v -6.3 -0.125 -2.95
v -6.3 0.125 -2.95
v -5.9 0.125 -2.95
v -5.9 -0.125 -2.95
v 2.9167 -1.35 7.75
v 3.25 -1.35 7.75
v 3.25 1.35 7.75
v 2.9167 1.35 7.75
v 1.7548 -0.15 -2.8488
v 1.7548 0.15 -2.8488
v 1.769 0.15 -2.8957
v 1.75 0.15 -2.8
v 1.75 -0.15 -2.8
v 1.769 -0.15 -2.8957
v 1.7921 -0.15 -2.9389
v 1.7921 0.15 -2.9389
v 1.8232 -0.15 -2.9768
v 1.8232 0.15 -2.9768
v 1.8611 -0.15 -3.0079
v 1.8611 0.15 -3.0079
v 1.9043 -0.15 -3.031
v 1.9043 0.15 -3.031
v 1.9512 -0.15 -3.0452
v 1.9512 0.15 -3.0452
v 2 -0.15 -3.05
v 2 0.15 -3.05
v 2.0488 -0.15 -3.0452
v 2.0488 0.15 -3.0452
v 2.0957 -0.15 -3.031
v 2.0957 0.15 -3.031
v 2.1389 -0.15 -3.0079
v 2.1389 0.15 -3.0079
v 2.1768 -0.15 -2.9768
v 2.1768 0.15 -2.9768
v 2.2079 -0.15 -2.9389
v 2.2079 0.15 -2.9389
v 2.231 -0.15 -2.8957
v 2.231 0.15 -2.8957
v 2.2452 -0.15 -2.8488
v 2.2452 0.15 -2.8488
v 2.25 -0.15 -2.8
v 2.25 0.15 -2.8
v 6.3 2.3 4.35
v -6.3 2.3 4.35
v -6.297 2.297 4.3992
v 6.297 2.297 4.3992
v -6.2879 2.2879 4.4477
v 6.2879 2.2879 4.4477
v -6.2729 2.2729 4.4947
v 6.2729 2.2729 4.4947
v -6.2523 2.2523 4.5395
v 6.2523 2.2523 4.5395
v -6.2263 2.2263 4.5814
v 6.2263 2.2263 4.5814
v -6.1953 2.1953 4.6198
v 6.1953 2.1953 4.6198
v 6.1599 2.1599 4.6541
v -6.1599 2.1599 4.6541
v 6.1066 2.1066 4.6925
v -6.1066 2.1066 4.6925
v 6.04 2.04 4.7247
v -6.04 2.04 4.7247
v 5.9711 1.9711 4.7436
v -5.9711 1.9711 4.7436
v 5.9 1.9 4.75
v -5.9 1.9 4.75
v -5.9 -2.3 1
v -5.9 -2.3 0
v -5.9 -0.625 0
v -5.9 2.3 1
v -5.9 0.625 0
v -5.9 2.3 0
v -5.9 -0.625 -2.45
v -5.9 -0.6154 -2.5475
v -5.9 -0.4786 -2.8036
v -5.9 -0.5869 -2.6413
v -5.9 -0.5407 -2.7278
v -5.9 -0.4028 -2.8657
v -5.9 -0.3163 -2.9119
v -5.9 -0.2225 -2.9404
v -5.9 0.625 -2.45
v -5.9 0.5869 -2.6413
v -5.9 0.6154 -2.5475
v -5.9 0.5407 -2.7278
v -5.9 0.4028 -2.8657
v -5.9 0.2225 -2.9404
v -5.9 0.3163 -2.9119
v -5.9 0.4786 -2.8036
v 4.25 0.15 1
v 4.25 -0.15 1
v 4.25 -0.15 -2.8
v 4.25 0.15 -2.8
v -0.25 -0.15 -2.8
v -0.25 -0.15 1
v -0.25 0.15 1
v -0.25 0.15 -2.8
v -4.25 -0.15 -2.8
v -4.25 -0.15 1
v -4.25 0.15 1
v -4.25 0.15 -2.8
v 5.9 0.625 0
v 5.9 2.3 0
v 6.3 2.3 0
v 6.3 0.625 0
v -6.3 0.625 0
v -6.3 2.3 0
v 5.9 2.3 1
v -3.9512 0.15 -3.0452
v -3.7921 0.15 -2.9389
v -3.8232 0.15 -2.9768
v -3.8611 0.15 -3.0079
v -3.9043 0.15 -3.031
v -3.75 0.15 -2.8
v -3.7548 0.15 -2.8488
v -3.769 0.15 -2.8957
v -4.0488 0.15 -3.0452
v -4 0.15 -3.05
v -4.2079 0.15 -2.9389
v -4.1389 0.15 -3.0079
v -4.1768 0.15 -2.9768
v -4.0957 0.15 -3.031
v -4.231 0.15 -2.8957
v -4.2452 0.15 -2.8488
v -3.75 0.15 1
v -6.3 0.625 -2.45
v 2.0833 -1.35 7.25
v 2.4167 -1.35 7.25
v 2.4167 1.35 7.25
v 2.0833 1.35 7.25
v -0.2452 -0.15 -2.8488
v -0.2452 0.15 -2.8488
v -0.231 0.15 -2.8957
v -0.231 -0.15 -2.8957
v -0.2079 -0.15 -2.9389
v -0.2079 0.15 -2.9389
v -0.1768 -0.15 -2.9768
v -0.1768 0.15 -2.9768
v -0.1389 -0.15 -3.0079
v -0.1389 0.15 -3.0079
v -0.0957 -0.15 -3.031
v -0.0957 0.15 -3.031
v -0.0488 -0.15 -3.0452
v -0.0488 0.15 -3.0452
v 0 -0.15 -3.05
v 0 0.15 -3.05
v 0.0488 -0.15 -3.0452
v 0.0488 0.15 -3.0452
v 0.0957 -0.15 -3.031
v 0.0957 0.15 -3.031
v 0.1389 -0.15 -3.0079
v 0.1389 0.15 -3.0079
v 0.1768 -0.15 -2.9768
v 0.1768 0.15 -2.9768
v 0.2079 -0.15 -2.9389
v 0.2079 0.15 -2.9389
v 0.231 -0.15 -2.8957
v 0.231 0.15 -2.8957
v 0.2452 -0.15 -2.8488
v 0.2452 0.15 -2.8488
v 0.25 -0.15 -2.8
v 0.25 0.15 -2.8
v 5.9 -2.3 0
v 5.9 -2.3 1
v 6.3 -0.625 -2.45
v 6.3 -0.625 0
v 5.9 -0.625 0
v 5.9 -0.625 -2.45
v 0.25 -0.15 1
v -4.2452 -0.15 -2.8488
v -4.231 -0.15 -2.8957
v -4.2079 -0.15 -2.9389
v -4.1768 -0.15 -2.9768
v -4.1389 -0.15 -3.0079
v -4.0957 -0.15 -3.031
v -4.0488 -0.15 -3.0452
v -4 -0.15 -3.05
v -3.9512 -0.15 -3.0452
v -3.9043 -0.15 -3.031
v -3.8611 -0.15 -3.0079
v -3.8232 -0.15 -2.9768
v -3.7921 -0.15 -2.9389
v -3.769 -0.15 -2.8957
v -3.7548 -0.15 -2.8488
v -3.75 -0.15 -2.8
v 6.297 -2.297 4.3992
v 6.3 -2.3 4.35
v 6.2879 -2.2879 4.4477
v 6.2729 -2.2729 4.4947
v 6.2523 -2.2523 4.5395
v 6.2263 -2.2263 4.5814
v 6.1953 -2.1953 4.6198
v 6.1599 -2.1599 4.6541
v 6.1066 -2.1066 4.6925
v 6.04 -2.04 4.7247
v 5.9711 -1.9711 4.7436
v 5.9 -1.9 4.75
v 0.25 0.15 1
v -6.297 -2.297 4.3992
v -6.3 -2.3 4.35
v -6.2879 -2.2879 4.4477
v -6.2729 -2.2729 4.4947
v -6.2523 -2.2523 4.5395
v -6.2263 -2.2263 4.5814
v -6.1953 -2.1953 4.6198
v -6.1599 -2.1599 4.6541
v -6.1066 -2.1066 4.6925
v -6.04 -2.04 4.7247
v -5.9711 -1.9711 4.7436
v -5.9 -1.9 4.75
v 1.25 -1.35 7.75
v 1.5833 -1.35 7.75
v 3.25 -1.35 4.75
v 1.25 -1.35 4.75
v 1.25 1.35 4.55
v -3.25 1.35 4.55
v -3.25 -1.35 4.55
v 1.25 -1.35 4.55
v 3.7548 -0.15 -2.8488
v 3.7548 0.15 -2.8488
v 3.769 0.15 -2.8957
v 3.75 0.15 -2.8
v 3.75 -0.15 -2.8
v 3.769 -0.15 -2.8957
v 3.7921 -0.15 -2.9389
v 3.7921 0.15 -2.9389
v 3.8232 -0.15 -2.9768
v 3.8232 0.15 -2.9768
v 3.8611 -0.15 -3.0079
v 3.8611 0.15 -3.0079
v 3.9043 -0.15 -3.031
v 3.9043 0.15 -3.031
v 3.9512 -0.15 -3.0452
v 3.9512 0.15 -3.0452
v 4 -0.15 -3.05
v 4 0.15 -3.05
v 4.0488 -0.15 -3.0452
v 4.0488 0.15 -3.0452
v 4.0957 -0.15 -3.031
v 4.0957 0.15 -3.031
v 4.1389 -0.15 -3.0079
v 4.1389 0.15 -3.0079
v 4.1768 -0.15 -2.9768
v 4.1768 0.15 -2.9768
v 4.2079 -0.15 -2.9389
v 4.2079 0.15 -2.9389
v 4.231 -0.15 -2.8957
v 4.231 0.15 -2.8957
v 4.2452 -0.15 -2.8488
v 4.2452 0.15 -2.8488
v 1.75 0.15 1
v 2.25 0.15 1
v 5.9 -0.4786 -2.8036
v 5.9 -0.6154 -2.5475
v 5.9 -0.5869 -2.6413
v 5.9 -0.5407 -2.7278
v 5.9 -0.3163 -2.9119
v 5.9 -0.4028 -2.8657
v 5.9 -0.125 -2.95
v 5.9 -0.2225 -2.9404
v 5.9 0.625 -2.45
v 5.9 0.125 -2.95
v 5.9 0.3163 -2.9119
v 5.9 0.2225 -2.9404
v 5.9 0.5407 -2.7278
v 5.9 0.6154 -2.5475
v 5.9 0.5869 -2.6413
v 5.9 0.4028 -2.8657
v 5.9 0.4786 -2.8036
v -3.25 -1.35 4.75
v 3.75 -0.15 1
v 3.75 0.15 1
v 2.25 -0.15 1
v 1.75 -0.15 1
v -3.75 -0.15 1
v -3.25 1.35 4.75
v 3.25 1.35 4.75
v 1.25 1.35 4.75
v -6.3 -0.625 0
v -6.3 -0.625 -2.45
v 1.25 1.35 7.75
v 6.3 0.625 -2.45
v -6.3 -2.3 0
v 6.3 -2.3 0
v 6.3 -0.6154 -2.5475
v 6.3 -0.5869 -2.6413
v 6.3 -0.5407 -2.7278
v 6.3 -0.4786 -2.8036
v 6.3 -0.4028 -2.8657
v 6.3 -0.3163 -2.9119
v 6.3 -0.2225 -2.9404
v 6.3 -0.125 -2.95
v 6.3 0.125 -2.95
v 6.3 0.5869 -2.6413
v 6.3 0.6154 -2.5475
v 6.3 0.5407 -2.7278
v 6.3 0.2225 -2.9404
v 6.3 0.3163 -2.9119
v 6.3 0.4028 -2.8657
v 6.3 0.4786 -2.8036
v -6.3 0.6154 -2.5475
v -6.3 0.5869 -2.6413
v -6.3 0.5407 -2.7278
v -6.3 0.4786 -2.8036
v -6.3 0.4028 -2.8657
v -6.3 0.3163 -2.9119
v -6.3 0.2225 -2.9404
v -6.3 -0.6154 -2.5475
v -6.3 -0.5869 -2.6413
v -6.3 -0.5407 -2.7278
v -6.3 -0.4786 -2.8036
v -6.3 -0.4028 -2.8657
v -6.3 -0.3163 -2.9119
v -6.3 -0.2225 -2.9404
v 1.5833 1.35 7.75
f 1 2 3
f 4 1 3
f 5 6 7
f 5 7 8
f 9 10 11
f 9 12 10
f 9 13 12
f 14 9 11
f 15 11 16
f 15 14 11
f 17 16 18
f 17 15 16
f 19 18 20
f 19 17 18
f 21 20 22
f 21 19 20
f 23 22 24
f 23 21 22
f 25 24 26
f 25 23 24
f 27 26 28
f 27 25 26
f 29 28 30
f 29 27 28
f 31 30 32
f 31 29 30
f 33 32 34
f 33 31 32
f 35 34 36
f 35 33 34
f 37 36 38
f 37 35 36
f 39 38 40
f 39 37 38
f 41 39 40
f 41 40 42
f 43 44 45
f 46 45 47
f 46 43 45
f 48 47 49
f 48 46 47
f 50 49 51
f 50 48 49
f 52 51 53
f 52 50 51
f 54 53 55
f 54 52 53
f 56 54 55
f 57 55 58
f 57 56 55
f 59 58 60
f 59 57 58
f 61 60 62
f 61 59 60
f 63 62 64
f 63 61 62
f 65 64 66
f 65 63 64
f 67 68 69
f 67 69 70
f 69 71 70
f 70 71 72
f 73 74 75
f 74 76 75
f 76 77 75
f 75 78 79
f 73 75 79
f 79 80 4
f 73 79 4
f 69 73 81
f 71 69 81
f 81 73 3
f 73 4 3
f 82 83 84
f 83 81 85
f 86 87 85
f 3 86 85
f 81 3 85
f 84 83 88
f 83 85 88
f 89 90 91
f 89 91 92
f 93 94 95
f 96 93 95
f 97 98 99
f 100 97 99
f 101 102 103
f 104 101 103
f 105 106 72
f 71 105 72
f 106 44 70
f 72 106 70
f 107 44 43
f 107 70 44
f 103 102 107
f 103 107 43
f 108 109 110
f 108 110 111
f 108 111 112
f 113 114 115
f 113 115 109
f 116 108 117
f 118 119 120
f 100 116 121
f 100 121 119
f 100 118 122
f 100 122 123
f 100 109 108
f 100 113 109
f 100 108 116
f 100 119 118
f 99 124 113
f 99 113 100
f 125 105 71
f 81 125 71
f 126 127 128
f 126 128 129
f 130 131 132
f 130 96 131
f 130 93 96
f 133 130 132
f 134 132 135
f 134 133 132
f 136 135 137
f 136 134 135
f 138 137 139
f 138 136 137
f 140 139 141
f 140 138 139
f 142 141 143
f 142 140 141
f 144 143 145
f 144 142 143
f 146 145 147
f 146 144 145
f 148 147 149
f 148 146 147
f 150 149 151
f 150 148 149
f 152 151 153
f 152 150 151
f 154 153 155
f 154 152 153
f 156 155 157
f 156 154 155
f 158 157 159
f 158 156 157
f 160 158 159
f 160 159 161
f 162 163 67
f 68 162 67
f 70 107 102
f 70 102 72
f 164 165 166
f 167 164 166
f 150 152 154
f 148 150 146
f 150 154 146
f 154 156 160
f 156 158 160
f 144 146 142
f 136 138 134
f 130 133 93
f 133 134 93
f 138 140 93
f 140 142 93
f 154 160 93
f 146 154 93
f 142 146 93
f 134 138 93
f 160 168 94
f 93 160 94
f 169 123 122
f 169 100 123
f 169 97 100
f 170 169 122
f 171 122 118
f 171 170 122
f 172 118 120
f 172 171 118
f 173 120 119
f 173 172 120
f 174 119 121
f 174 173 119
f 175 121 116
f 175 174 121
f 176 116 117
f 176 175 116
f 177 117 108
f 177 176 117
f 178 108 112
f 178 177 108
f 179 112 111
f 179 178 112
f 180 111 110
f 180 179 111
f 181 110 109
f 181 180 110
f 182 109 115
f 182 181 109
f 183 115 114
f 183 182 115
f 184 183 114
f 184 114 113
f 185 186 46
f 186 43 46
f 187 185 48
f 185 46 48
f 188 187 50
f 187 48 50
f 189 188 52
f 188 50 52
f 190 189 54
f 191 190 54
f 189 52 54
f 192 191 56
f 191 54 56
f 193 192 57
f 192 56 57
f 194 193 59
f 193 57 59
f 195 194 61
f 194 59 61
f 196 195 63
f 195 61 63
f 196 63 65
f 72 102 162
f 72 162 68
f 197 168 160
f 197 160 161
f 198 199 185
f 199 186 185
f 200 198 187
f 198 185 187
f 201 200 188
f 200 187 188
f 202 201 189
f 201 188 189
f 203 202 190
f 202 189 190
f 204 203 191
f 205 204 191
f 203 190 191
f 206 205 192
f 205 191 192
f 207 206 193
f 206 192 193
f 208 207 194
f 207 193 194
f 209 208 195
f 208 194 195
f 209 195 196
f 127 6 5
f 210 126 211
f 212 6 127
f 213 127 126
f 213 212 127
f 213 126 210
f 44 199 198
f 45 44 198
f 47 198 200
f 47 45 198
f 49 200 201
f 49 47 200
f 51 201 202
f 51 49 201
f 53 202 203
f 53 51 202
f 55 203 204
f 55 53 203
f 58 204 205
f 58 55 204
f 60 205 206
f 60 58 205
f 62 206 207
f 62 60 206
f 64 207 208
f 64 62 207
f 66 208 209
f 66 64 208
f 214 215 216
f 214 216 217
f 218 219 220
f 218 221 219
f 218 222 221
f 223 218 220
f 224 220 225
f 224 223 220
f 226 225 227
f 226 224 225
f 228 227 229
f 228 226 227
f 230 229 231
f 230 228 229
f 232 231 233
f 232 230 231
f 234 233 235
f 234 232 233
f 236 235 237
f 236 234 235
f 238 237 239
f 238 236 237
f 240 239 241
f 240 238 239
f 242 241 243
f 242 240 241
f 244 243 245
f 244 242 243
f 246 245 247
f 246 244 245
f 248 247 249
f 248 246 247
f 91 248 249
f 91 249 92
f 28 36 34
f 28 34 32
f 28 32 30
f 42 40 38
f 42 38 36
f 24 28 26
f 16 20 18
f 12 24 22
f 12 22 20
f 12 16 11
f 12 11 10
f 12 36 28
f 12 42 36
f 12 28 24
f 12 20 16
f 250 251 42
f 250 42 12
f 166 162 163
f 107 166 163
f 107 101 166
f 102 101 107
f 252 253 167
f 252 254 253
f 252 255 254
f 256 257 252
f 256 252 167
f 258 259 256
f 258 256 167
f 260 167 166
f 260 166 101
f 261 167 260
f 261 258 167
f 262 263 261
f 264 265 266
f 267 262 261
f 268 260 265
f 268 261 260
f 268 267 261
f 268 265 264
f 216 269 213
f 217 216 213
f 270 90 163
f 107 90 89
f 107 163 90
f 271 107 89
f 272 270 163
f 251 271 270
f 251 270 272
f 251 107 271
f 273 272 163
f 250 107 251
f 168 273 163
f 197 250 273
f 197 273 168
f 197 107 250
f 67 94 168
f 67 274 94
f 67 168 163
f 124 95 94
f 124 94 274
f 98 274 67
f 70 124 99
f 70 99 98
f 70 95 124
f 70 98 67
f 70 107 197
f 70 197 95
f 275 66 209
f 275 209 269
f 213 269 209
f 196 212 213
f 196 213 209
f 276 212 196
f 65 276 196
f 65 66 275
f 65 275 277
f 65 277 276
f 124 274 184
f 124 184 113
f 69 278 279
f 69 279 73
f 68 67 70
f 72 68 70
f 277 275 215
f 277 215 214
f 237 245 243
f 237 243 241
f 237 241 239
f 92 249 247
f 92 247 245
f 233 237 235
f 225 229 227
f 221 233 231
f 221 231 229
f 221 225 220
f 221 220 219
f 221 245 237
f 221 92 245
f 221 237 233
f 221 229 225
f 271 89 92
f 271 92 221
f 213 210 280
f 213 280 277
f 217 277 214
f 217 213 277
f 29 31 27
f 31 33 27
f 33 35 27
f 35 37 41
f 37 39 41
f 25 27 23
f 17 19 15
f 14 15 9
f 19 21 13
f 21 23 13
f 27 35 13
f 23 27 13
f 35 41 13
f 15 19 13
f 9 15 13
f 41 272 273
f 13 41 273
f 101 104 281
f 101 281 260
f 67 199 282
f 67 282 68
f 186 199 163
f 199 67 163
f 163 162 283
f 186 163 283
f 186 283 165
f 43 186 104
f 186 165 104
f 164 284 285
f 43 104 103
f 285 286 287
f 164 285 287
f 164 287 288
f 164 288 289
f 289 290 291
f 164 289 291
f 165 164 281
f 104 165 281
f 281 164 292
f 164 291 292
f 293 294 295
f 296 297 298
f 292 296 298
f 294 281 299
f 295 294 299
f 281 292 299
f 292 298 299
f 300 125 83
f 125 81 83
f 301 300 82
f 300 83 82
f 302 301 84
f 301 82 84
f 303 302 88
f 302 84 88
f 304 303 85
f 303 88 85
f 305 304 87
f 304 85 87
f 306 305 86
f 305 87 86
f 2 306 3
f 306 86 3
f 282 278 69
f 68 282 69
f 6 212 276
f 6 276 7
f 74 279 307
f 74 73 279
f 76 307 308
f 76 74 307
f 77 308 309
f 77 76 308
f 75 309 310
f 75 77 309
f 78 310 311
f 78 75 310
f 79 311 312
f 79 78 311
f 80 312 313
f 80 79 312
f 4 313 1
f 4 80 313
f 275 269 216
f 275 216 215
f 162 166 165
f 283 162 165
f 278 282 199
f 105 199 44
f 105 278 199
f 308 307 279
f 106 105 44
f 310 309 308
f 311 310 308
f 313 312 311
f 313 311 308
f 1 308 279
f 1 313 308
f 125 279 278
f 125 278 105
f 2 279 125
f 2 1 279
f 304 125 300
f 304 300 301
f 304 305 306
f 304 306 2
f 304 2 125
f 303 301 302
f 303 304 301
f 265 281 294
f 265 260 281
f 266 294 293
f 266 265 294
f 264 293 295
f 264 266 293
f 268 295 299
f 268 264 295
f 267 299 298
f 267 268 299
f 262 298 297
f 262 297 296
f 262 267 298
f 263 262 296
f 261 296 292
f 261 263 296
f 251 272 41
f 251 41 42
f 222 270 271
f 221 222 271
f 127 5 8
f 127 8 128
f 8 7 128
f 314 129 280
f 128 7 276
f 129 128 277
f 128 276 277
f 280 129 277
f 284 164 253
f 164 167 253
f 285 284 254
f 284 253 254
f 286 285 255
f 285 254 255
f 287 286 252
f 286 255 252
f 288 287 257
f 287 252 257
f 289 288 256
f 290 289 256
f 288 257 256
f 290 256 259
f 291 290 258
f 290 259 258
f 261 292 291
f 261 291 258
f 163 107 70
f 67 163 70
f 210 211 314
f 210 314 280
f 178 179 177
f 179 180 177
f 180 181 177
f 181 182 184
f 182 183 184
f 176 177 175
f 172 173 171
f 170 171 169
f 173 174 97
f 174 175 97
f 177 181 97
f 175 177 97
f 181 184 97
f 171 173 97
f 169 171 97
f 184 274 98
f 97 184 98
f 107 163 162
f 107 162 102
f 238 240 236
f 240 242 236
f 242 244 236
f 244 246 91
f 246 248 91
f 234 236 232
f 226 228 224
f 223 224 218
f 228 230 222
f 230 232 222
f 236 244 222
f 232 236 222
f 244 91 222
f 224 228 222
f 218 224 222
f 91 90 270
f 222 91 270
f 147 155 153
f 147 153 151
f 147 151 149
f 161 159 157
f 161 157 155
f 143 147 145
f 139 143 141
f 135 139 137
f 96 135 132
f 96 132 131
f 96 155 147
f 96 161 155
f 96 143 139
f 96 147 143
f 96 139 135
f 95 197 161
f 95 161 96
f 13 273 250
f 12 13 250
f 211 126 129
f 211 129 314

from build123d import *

# Parameters (mm, degrees)
SKETCH1_W                         = 12.6
SKETCH1_H                         = 4.6
BOSS_EXTRUDE1_DEPTH               = 4.75
FILLET2_R                         = 0.4
SKETCH2_W                         = 6.5
SKETCH2_H                         = 2.7
CUT_EXTRUDE1_DEPTH                = 0.2
BOSS_EXTRUDE2_DEPTH               = 2.7
SKETCH8_W                         = 11.8
SKETCH8_H                         = 4.6
CUT_EXTRUDE2_DEPTH                = 1
SKETCH5_W                         = 0.4
SKETCH5_H                         = 1.25
BOSS_EXTRUDE3_DEPTH               = 2.95
FILLET3_R                         = 0.5
FILLET3_OF_MIRROR1_R              = 0.5
SKETCH10_W                        = 0.5
SKETCH10_H                        = 0.3
BOSS_EXTRUDE6_DEPTH               = 4.05
FILLET5_RADIUS                    = 0.25
FILLET5_LENGTH                    = 0.3
LPATTERN3_COUNT                   = 3
LPATTERN3_PITCH                   = 2
FILLET5_OF_LPATTERN3_2_RADIUS     = 0.25
FILLET5_OF_LPATTERN3_2_LENGTH     = 0.3
FILLET5_OF_LPATTERN3_3_RADIUS     = 0.25
FILLET5_OF_LPATTERN3_3_LENGTH     = 0.3
LPATTERN3_COL_COUNT               = 2
LPATTERN3_COL_PITCH               = 4
FILLET5_OF_LPATTERN3_COL_2_RADIUS = 0.25
FILLET5_OF_LPATTERN3_COL_2_LENGTH = 0.3
SKETCH9_W                         = 11.8
SKETCH9_H                         = 4.6
BOSS_EXTRUDE7_DEPTH               = 1


with BuildPart() as part:
    # Sketch1 → Boss-Extrude1 (new body)
    with BuildSketch(Plane.XY):
        Rectangle(SKETCH1_W, SKETCH1_H)
    extrude(amount=BOSS_EXTRUDE1_DEPTH)

    # Fillet2
    fillet2_edges = [part.edges().sort_by_distance(p)[0] for p in [
        (-6.3, 0, 4.75),
        (0, -2.3, 4.75),
        (6.3, 0, 4.75),
        (0, 2.3, 4.75),
    ]]
    fillet(fillet2_edges, radius=FILLET2_R)

    # Sketch2 → Cut-Extrude1 (cut)
    with BuildSketch(Plane.XY.offset(4.75)):
        Rectangle(SKETCH2_W, SKETCH2_H)
    extrude(amount=-CUT_EXTRUDE1_DEPTH, mode=Mode.SUBTRACT)

    # Sketch4 → Boss-Extrude2 (add)
    with BuildSketch(Plane(origin=(0, -1.35, 0), x_dir=(1, 0, 0), z_dir=(0, 1, 0))):
        Polygon((3.25, -4.55), (3.25, -7.75), (2.916666667, -7.75), (2.416666667, -7.25), (2.083333333, -7.25), (1.583333333, -7.75), (1.25, -7.75), (1.25, -4.55), align=None)
    extrude(amount=BOSS_EXTRUDE2_DEPTH)

    # Sketch8 → Cut-Extrude2 (cut)
    with BuildSketch(Plane(origin=(0, 0, 0), x_dir=(-1, 0, 0), z_dir=(0, 0, -1))):
        Rectangle(SKETCH8_W, SKETCH8_H)
    extrude(amount=-CUT_EXTRUDE2_DEPTH, mode=Mode.SUBTRACT)

    # Sketch5 → Boss-Extrude3 (add)
    with BuildSketch(Plane(origin=(0, 0, 0), x_dir=(-1, 0, 0), z_dir=(0, 0, -1))):
        with Locations((-6.1, 0)):
            Rectangle(SKETCH5_W, SKETCH5_H)
    boss_extrude3 = extrude(amount=BOSS_EXTRUDE3_DEPTH)

    # Fillet3
    fillet3_edges = [part.edges().sort_by_distance(p)[0] for p in [
        (6.1, 0.625, -2.95),
        (6.1, -0.625, -2.95),
    ]]
    fillet(fillet3_edges, radius=FILLET3_R)

    # Mirror1: Boss-Extrude3 across plane
    add(boss_extrude3.mirror(Plane(origin=(0, 0, 0), x_dir=(0, 0, 1), z_dir=(1, 0, 0))))

    # Fillet3 of Mirror1
    fillet3_of_mirror1_edges = [part.edges().sort_by_distance(p)[0] for p in [
        (-6.1, 0.625, -2.95),
        (-6.1, -0.625, -2.95),
    ]]
    fillet(fillet3_of_mirror1_edges, radius=FILLET3_OF_MIRROR1_R)

    # Sketch10 → Boss-Extrude6 (add)
    with BuildSketch(Plane(origin=(0, 0, 1), x_dir=(-1, 0, 0), z_dir=(0, 0, -1))):
        Rectangle(SKETCH10_W, SKETCH10_H)
    boss_extrude6 = extrude(amount=BOSS_EXTRUDE6_DEPTH)

    # Fillet5: full round fillet: the end face becomes a half cylinder, R = half its width
    fillet5_face = Plane((0, 0, -3.05), x_dir=(0, -1, 0), z_dir=(0, 0, -1))  # on the end face: x along it, z out of the body
    fillet5_slab = fillet5_face.offset(-FILLET5_RADIUS / 2) * Box(FILLET5_LENGTH, 2 * FILLET5_RADIUS, FILLET5_RADIUS, mode=Mode.PRIVATE)  # the body's end, R deep
    fillet5_round = Plane((0, 0, -2.8), x_dir=(0, 0, -1), z_dir=(0, -1, 0)) * Cylinder(FILLET5_RADIUS, FILLET5_LENGTH, mode=Mode.PRIVATE)  # its axis R under the face
    add(fillet5_slab - fillet5_round, mode=Mode.SUBTRACT)

    # LPattern3: Boss-Extrude6 ×3
    with Locations(*[(i * LPATTERN3_PITCH, 0, 0) for i in range(1, LPATTERN3_COUNT)]):
        add(boss_extrude6)

    # Fillet5 of LPattern3 2: full round fillet: the end face becomes a half cylinder, R = half its width
    fillet5_of_lpattern3_2_face = Plane((2, 0, -3.05), x_dir=(0, -1, 0), z_dir=(0, 0, -1))  # on the end face: x along it, z out of the body
    fillet5_of_lpattern3_2_slab = fillet5_of_lpattern3_2_face.offset(-FILLET5_OF_LPATTERN3_2_RADIUS / 2) * Box(FILLET5_OF_LPATTERN3_2_LENGTH, 2 * FILLET5_OF_LPATTERN3_2_RADIUS, FILLET5_OF_LPATTERN3_2_RADIUS, mode=Mode.PRIVATE)  # the body's end, R deep
    fillet5_of_lpattern3_2_round = Plane((2, 0, -2.8), x_dir=(0, 0, -1), z_dir=(0, -1, 0)) * Cylinder(FILLET5_OF_LPATTERN3_2_RADIUS, FILLET5_OF_LPATTERN3_2_LENGTH, mode=Mode.PRIVATE)  # its axis R under the face
    add(fillet5_of_lpattern3_2_slab - fillet5_of_lpattern3_2_round, mode=Mode.SUBTRACT)

    # Fillet5 of LPattern3 3: full round fillet: the end face becomes a half cylinder, R = half its width
    fillet5_of_lpattern3_3_face = Plane((4, 0, -3.05), x_dir=(0, -1, 0), z_dir=(0, 0, -1))  # on the end face: x along it, z out of the body
    fillet5_of_lpattern3_3_slab = fillet5_of_lpattern3_3_face.offset(-FILLET5_OF_LPATTERN3_3_RADIUS / 2) * Box(FILLET5_OF_LPATTERN3_3_LENGTH, 2 * FILLET5_OF_LPATTERN3_3_RADIUS, FILLET5_OF_LPATTERN3_3_RADIUS, mode=Mode.PRIVATE)  # the body's end, R deep
    fillet5_of_lpattern3_3_round = Plane((4, 0, -2.8), x_dir=(0, 0, -1), z_dir=(0, -1, 0)) * Cylinder(FILLET5_OF_LPATTERN3_3_RADIUS, FILLET5_OF_LPATTERN3_3_LENGTH, mode=Mode.PRIVATE)  # its axis R under the face
    add(fillet5_of_lpattern3_3_slab - fillet5_of_lpattern3_3_round, mode=Mode.SUBTRACT)

    # LPattern3 col: Boss-Extrude6 ×2
    with Locations(*[(-i * LPATTERN3_COL_PITCH, 0, 0) for i in range(1, LPATTERN3_COL_COUNT)]):
        add(boss_extrude6)

    # Fillet5 of LPattern3 col 2: full round fillet: the end face becomes a half cylinder, R = half its width
    fillet5_of_lpattern3_col_2_face = Plane((-4, 0, -3.05), x_dir=(0, -1, 0), z_dir=(0, 0, -1))  # on the end face: x along it, z out of the body
    fillet5_of_lpattern3_col_2_slab = fillet5_of_lpattern3_col_2_face.offset(-FILLET5_OF_LPATTERN3_COL_2_RADIUS / 2) * Box(FILLET5_OF_LPATTERN3_COL_2_LENGTH, 2 * FILLET5_OF_LPATTERN3_COL_2_RADIUS, FILLET5_OF_LPATTERN3_COL_2_RADIUS, mode=Mode.PRIVATE)  # the body's end, R deep
    fillet5_of_lpattern3_col_2_round = Plane((-4, 0, -2.8), x_dir=(0, 0, -1), z_dir=(0, -1, 0)) * Cylinder(FILLET5_OF_LPATTERN3_COL_2_RADIUS, FILLET5_OF_LPATTERN3_COL_2_LENGTH, mode=Mode.PRIVATE)  # its axis R under the face
    add(fillet5_of_lpattern3_col_2_slab - fillet5_of_lpattern3_col_2_round, mode=Mode.SUBTRACT)


with BuildPart() as body_2:
    # Sketch9 → Boss-Extrude7 (new body)
    with BuildSketch(Plane(origin=(0, 0, 1), x_dir=(-1, 0, 0), z_dir=(0, 0, -1))):
        Rectangle(SKETCH9_W, SKETCH9_H)
    extrude(amount=BOSS_EXTRUDE7_DEPTH)


solid = Compound([part.part, body_2.part])
